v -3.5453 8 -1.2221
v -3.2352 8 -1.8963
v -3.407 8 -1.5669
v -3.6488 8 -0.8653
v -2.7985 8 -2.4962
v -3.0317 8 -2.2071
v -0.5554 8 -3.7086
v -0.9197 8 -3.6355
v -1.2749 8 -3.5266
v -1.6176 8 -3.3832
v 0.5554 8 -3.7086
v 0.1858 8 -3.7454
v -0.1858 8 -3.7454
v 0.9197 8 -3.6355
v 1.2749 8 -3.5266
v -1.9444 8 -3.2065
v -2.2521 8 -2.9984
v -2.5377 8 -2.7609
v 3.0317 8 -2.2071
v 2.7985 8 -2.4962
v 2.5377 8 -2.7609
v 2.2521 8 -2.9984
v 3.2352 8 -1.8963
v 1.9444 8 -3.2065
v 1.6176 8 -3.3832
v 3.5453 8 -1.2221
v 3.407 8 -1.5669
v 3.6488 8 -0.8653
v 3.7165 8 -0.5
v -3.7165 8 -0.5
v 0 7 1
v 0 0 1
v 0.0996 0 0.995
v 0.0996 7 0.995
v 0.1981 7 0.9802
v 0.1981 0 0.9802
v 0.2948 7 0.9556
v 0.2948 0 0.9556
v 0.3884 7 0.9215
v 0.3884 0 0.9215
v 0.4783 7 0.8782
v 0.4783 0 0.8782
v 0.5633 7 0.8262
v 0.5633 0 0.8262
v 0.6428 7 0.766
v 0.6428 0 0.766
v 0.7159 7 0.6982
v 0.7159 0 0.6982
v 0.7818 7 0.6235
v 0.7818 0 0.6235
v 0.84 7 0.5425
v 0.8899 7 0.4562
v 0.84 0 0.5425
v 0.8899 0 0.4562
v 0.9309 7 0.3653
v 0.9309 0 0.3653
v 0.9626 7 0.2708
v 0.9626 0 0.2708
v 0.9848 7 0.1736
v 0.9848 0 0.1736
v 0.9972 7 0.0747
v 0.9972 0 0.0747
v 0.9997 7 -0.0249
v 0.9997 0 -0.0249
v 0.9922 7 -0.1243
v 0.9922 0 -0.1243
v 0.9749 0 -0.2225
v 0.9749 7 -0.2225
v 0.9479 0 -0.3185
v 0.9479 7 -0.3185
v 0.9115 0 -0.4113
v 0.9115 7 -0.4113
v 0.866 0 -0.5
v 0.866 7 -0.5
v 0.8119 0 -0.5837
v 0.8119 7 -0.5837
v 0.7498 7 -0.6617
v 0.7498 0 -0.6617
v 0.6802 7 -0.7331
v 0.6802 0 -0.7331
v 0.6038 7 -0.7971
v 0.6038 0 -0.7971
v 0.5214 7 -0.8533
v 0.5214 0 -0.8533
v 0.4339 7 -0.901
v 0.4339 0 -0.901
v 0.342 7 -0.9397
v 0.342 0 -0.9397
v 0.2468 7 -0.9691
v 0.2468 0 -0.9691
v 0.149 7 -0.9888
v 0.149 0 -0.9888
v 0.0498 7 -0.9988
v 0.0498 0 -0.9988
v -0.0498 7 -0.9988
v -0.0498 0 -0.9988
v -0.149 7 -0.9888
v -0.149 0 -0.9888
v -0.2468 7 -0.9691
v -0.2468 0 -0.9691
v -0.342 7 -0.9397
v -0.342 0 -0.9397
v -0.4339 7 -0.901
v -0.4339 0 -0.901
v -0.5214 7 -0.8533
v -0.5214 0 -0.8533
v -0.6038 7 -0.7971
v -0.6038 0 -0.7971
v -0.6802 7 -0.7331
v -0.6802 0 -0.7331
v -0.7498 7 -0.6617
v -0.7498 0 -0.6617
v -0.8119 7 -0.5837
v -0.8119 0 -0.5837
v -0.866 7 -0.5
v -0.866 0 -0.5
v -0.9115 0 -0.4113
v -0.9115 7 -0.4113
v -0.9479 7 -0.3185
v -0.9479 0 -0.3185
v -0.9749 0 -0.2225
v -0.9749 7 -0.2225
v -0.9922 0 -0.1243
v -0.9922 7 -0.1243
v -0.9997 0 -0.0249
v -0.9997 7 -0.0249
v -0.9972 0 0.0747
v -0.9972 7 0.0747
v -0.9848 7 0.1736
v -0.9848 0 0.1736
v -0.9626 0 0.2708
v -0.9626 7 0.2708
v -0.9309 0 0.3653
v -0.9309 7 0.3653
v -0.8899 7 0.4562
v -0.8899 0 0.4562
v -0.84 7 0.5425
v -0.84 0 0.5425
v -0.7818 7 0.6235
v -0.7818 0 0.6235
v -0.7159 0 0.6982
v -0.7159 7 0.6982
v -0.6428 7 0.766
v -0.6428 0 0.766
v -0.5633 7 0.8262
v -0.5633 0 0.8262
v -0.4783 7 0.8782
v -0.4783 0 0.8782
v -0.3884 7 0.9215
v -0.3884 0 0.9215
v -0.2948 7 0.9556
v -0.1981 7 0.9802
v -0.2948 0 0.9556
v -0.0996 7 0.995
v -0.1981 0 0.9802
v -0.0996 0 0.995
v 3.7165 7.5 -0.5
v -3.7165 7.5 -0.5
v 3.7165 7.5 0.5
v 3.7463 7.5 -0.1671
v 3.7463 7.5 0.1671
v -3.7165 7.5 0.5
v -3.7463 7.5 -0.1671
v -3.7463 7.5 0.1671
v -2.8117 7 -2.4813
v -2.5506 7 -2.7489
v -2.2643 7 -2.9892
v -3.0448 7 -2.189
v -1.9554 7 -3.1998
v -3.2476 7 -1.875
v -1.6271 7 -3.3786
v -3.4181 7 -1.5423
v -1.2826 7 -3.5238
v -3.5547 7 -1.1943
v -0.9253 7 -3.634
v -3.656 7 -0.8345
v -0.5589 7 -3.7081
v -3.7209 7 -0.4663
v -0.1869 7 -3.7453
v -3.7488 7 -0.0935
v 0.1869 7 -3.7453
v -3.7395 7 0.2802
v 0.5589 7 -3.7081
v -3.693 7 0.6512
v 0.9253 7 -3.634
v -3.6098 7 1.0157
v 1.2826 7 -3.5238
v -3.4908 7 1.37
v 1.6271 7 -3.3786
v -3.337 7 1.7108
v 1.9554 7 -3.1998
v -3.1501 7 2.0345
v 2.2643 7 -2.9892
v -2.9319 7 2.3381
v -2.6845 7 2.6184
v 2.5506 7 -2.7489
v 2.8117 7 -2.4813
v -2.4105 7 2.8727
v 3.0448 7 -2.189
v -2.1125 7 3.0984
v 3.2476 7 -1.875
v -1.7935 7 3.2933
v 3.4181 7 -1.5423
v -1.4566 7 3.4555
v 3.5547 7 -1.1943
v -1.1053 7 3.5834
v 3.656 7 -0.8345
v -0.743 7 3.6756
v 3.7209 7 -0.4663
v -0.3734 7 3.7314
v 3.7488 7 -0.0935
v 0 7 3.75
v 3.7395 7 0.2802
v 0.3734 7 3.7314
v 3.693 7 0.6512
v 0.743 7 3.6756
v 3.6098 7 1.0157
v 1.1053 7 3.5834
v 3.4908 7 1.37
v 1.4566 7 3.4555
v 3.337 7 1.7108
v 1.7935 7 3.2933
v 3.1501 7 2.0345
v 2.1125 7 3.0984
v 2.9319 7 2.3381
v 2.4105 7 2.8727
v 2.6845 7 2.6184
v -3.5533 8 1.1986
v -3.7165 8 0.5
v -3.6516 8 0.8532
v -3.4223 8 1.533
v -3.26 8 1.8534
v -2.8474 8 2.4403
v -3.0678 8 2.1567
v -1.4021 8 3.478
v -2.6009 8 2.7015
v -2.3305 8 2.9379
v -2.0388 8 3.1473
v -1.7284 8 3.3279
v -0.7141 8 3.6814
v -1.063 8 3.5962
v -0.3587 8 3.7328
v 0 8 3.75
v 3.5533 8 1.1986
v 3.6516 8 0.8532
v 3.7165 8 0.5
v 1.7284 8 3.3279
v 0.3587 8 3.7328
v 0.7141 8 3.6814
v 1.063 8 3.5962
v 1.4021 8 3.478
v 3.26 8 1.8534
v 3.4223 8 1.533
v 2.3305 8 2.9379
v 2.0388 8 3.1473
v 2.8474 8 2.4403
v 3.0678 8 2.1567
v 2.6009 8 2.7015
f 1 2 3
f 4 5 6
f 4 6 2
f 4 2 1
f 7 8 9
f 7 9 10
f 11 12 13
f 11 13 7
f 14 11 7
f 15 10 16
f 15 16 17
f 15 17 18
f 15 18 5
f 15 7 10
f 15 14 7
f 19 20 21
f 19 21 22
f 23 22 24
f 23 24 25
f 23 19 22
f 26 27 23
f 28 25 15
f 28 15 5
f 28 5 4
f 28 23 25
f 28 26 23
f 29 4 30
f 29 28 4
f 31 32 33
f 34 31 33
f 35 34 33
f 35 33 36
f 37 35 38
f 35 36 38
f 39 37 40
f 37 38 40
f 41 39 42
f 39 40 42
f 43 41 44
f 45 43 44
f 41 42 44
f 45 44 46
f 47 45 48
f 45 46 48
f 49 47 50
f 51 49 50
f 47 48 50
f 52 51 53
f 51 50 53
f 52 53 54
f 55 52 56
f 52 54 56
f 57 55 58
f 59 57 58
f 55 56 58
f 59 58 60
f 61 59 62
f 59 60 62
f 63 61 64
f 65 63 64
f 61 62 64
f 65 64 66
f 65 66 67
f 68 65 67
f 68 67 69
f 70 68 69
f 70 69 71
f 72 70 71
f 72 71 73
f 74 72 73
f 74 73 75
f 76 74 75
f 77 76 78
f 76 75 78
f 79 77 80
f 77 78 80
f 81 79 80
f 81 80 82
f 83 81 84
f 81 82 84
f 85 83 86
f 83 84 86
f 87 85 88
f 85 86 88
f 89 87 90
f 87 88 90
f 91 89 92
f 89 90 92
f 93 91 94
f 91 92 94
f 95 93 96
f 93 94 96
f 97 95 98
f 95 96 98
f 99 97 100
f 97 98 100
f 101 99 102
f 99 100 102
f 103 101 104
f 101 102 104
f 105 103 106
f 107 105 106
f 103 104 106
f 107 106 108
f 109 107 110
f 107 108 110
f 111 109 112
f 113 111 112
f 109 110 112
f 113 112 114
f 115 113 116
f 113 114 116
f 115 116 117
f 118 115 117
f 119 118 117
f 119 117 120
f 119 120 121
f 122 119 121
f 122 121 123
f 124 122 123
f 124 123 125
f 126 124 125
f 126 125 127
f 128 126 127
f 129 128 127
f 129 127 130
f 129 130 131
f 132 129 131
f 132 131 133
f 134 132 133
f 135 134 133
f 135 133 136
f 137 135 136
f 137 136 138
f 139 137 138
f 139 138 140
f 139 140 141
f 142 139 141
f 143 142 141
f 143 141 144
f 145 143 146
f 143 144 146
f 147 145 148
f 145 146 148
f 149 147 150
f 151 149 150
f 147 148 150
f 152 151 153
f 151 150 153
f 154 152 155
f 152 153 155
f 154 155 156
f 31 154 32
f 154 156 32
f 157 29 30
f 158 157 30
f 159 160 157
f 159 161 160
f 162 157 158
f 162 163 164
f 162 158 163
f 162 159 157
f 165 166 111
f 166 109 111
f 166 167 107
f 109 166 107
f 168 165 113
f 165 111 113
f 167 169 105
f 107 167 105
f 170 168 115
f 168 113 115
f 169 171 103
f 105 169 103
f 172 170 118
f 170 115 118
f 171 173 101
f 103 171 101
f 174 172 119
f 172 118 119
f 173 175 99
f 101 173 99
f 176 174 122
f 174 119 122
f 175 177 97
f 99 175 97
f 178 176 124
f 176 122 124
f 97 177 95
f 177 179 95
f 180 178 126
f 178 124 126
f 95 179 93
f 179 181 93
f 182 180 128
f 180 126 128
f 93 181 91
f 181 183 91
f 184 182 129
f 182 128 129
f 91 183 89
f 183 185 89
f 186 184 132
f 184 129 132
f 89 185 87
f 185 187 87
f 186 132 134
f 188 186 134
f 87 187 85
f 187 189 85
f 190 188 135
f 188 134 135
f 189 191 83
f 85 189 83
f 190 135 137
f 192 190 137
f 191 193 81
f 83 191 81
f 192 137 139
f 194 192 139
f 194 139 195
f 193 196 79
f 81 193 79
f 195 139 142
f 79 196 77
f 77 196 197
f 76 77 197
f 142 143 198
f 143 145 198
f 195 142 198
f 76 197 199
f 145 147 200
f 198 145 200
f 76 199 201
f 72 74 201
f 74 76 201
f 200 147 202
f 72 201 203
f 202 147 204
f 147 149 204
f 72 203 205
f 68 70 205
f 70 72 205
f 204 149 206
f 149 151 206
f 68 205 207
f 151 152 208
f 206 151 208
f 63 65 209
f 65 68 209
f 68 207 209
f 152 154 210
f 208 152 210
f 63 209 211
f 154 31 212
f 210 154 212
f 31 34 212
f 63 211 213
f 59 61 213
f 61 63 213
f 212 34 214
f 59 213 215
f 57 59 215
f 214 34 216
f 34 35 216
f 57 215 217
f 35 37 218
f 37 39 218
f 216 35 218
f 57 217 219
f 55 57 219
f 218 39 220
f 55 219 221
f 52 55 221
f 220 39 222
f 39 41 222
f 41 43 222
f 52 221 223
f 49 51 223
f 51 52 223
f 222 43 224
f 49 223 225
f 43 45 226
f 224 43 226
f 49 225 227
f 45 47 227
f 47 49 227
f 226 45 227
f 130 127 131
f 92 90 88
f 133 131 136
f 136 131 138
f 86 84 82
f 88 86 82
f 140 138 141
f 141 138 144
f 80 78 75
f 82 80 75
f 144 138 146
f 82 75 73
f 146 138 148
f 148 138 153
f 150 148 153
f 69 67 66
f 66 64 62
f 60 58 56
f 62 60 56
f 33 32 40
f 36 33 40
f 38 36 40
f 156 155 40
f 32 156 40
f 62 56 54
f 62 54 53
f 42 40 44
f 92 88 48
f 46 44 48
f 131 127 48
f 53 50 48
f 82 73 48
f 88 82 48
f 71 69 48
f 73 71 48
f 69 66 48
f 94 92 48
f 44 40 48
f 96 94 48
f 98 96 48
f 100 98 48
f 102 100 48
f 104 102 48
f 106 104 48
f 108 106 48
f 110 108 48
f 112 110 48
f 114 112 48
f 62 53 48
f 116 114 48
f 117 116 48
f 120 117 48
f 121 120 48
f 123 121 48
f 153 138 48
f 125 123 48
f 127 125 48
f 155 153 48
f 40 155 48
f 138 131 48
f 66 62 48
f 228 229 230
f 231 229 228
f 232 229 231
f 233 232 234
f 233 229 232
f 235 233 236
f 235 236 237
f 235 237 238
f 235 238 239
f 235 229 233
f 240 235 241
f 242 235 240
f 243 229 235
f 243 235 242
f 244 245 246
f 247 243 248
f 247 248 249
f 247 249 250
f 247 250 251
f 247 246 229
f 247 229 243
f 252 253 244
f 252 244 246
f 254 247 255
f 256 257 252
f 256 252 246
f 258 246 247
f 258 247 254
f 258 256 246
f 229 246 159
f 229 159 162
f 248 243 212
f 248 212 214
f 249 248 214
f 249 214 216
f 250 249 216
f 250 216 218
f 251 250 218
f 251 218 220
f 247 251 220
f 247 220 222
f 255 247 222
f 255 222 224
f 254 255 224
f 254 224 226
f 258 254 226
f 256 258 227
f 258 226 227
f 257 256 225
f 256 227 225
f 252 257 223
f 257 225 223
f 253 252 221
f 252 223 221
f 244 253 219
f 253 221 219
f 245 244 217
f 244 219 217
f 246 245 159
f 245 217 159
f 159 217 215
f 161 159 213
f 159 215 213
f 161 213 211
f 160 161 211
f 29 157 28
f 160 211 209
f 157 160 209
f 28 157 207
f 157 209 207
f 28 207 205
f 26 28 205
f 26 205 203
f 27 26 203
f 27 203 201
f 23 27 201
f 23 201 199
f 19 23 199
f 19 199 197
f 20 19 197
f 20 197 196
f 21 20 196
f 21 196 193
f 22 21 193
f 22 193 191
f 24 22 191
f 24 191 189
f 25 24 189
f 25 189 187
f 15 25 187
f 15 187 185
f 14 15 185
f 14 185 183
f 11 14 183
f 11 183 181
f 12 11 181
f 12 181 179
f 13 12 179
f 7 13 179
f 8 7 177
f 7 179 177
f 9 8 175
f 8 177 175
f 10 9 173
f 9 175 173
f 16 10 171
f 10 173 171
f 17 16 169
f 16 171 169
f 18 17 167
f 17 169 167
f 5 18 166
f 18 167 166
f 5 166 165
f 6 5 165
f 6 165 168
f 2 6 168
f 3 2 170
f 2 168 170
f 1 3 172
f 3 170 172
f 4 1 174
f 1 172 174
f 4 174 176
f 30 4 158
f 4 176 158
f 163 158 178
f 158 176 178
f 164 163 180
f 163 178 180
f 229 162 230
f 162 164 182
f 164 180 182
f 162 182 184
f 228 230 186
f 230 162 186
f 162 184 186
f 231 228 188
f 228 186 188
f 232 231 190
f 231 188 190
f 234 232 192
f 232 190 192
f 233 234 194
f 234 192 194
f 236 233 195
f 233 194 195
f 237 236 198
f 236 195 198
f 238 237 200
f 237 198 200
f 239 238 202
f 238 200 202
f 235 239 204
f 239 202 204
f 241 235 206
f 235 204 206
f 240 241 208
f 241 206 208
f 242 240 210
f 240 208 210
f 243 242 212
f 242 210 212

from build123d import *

# Parameters (mm, degrees)
SKETCH_1_R          = 1
EXTRUDE_1_DEPTH     = 7
SKETCH_2_R          = 3.75
EXTRUDE_2_DEPTH     = 1
SKETCH_3_W          = 8.378804874
SKETCH_3_H          = 1
CUT_EXTRUDE_1_DEPTH = 0.5


with BuildPart() as part:
    # 草图1 → 拉伸1 (new body)
    with BuildSketch(Plane(origin=(0, 0, 0), x_dir=(1, 0, 0), z_dir=(0, 1, 0))):
        with Locations(Location((0, 0, 0), (0, 0, 270))):
            Circle(SKETCH_1_R)
    extrude(amount=EXTRUDE_1_DEPTH)

    # 草图2 → 拉伸2 (add)
    with BuildSketch(Plane(origin=(0, 7, 0), x_dir=(-1, 0, 0), z_dir=(0, 1, 0))):
        with Locations(Location((0, 0, 0), (0, 0, 90))):
            Circle(SKETCH_2_R)
    extrude(amount=EXTRUDE_2_DEPTH)

    # 草图3 → 切除-拉伸1 (cut)
    with BuildSketch(Plane(origin=(0, 8, 0), x_dir=(-1, 0, 0), z_dir=(0, 1, 0))):
        Rectangle(SKETCH_3_W, SKETCH_3_H)
    extrude(amount=-CUT_EXTRUDE_1_DEPTH, mode=Mode.SUBTRACT)


solid = part.part
